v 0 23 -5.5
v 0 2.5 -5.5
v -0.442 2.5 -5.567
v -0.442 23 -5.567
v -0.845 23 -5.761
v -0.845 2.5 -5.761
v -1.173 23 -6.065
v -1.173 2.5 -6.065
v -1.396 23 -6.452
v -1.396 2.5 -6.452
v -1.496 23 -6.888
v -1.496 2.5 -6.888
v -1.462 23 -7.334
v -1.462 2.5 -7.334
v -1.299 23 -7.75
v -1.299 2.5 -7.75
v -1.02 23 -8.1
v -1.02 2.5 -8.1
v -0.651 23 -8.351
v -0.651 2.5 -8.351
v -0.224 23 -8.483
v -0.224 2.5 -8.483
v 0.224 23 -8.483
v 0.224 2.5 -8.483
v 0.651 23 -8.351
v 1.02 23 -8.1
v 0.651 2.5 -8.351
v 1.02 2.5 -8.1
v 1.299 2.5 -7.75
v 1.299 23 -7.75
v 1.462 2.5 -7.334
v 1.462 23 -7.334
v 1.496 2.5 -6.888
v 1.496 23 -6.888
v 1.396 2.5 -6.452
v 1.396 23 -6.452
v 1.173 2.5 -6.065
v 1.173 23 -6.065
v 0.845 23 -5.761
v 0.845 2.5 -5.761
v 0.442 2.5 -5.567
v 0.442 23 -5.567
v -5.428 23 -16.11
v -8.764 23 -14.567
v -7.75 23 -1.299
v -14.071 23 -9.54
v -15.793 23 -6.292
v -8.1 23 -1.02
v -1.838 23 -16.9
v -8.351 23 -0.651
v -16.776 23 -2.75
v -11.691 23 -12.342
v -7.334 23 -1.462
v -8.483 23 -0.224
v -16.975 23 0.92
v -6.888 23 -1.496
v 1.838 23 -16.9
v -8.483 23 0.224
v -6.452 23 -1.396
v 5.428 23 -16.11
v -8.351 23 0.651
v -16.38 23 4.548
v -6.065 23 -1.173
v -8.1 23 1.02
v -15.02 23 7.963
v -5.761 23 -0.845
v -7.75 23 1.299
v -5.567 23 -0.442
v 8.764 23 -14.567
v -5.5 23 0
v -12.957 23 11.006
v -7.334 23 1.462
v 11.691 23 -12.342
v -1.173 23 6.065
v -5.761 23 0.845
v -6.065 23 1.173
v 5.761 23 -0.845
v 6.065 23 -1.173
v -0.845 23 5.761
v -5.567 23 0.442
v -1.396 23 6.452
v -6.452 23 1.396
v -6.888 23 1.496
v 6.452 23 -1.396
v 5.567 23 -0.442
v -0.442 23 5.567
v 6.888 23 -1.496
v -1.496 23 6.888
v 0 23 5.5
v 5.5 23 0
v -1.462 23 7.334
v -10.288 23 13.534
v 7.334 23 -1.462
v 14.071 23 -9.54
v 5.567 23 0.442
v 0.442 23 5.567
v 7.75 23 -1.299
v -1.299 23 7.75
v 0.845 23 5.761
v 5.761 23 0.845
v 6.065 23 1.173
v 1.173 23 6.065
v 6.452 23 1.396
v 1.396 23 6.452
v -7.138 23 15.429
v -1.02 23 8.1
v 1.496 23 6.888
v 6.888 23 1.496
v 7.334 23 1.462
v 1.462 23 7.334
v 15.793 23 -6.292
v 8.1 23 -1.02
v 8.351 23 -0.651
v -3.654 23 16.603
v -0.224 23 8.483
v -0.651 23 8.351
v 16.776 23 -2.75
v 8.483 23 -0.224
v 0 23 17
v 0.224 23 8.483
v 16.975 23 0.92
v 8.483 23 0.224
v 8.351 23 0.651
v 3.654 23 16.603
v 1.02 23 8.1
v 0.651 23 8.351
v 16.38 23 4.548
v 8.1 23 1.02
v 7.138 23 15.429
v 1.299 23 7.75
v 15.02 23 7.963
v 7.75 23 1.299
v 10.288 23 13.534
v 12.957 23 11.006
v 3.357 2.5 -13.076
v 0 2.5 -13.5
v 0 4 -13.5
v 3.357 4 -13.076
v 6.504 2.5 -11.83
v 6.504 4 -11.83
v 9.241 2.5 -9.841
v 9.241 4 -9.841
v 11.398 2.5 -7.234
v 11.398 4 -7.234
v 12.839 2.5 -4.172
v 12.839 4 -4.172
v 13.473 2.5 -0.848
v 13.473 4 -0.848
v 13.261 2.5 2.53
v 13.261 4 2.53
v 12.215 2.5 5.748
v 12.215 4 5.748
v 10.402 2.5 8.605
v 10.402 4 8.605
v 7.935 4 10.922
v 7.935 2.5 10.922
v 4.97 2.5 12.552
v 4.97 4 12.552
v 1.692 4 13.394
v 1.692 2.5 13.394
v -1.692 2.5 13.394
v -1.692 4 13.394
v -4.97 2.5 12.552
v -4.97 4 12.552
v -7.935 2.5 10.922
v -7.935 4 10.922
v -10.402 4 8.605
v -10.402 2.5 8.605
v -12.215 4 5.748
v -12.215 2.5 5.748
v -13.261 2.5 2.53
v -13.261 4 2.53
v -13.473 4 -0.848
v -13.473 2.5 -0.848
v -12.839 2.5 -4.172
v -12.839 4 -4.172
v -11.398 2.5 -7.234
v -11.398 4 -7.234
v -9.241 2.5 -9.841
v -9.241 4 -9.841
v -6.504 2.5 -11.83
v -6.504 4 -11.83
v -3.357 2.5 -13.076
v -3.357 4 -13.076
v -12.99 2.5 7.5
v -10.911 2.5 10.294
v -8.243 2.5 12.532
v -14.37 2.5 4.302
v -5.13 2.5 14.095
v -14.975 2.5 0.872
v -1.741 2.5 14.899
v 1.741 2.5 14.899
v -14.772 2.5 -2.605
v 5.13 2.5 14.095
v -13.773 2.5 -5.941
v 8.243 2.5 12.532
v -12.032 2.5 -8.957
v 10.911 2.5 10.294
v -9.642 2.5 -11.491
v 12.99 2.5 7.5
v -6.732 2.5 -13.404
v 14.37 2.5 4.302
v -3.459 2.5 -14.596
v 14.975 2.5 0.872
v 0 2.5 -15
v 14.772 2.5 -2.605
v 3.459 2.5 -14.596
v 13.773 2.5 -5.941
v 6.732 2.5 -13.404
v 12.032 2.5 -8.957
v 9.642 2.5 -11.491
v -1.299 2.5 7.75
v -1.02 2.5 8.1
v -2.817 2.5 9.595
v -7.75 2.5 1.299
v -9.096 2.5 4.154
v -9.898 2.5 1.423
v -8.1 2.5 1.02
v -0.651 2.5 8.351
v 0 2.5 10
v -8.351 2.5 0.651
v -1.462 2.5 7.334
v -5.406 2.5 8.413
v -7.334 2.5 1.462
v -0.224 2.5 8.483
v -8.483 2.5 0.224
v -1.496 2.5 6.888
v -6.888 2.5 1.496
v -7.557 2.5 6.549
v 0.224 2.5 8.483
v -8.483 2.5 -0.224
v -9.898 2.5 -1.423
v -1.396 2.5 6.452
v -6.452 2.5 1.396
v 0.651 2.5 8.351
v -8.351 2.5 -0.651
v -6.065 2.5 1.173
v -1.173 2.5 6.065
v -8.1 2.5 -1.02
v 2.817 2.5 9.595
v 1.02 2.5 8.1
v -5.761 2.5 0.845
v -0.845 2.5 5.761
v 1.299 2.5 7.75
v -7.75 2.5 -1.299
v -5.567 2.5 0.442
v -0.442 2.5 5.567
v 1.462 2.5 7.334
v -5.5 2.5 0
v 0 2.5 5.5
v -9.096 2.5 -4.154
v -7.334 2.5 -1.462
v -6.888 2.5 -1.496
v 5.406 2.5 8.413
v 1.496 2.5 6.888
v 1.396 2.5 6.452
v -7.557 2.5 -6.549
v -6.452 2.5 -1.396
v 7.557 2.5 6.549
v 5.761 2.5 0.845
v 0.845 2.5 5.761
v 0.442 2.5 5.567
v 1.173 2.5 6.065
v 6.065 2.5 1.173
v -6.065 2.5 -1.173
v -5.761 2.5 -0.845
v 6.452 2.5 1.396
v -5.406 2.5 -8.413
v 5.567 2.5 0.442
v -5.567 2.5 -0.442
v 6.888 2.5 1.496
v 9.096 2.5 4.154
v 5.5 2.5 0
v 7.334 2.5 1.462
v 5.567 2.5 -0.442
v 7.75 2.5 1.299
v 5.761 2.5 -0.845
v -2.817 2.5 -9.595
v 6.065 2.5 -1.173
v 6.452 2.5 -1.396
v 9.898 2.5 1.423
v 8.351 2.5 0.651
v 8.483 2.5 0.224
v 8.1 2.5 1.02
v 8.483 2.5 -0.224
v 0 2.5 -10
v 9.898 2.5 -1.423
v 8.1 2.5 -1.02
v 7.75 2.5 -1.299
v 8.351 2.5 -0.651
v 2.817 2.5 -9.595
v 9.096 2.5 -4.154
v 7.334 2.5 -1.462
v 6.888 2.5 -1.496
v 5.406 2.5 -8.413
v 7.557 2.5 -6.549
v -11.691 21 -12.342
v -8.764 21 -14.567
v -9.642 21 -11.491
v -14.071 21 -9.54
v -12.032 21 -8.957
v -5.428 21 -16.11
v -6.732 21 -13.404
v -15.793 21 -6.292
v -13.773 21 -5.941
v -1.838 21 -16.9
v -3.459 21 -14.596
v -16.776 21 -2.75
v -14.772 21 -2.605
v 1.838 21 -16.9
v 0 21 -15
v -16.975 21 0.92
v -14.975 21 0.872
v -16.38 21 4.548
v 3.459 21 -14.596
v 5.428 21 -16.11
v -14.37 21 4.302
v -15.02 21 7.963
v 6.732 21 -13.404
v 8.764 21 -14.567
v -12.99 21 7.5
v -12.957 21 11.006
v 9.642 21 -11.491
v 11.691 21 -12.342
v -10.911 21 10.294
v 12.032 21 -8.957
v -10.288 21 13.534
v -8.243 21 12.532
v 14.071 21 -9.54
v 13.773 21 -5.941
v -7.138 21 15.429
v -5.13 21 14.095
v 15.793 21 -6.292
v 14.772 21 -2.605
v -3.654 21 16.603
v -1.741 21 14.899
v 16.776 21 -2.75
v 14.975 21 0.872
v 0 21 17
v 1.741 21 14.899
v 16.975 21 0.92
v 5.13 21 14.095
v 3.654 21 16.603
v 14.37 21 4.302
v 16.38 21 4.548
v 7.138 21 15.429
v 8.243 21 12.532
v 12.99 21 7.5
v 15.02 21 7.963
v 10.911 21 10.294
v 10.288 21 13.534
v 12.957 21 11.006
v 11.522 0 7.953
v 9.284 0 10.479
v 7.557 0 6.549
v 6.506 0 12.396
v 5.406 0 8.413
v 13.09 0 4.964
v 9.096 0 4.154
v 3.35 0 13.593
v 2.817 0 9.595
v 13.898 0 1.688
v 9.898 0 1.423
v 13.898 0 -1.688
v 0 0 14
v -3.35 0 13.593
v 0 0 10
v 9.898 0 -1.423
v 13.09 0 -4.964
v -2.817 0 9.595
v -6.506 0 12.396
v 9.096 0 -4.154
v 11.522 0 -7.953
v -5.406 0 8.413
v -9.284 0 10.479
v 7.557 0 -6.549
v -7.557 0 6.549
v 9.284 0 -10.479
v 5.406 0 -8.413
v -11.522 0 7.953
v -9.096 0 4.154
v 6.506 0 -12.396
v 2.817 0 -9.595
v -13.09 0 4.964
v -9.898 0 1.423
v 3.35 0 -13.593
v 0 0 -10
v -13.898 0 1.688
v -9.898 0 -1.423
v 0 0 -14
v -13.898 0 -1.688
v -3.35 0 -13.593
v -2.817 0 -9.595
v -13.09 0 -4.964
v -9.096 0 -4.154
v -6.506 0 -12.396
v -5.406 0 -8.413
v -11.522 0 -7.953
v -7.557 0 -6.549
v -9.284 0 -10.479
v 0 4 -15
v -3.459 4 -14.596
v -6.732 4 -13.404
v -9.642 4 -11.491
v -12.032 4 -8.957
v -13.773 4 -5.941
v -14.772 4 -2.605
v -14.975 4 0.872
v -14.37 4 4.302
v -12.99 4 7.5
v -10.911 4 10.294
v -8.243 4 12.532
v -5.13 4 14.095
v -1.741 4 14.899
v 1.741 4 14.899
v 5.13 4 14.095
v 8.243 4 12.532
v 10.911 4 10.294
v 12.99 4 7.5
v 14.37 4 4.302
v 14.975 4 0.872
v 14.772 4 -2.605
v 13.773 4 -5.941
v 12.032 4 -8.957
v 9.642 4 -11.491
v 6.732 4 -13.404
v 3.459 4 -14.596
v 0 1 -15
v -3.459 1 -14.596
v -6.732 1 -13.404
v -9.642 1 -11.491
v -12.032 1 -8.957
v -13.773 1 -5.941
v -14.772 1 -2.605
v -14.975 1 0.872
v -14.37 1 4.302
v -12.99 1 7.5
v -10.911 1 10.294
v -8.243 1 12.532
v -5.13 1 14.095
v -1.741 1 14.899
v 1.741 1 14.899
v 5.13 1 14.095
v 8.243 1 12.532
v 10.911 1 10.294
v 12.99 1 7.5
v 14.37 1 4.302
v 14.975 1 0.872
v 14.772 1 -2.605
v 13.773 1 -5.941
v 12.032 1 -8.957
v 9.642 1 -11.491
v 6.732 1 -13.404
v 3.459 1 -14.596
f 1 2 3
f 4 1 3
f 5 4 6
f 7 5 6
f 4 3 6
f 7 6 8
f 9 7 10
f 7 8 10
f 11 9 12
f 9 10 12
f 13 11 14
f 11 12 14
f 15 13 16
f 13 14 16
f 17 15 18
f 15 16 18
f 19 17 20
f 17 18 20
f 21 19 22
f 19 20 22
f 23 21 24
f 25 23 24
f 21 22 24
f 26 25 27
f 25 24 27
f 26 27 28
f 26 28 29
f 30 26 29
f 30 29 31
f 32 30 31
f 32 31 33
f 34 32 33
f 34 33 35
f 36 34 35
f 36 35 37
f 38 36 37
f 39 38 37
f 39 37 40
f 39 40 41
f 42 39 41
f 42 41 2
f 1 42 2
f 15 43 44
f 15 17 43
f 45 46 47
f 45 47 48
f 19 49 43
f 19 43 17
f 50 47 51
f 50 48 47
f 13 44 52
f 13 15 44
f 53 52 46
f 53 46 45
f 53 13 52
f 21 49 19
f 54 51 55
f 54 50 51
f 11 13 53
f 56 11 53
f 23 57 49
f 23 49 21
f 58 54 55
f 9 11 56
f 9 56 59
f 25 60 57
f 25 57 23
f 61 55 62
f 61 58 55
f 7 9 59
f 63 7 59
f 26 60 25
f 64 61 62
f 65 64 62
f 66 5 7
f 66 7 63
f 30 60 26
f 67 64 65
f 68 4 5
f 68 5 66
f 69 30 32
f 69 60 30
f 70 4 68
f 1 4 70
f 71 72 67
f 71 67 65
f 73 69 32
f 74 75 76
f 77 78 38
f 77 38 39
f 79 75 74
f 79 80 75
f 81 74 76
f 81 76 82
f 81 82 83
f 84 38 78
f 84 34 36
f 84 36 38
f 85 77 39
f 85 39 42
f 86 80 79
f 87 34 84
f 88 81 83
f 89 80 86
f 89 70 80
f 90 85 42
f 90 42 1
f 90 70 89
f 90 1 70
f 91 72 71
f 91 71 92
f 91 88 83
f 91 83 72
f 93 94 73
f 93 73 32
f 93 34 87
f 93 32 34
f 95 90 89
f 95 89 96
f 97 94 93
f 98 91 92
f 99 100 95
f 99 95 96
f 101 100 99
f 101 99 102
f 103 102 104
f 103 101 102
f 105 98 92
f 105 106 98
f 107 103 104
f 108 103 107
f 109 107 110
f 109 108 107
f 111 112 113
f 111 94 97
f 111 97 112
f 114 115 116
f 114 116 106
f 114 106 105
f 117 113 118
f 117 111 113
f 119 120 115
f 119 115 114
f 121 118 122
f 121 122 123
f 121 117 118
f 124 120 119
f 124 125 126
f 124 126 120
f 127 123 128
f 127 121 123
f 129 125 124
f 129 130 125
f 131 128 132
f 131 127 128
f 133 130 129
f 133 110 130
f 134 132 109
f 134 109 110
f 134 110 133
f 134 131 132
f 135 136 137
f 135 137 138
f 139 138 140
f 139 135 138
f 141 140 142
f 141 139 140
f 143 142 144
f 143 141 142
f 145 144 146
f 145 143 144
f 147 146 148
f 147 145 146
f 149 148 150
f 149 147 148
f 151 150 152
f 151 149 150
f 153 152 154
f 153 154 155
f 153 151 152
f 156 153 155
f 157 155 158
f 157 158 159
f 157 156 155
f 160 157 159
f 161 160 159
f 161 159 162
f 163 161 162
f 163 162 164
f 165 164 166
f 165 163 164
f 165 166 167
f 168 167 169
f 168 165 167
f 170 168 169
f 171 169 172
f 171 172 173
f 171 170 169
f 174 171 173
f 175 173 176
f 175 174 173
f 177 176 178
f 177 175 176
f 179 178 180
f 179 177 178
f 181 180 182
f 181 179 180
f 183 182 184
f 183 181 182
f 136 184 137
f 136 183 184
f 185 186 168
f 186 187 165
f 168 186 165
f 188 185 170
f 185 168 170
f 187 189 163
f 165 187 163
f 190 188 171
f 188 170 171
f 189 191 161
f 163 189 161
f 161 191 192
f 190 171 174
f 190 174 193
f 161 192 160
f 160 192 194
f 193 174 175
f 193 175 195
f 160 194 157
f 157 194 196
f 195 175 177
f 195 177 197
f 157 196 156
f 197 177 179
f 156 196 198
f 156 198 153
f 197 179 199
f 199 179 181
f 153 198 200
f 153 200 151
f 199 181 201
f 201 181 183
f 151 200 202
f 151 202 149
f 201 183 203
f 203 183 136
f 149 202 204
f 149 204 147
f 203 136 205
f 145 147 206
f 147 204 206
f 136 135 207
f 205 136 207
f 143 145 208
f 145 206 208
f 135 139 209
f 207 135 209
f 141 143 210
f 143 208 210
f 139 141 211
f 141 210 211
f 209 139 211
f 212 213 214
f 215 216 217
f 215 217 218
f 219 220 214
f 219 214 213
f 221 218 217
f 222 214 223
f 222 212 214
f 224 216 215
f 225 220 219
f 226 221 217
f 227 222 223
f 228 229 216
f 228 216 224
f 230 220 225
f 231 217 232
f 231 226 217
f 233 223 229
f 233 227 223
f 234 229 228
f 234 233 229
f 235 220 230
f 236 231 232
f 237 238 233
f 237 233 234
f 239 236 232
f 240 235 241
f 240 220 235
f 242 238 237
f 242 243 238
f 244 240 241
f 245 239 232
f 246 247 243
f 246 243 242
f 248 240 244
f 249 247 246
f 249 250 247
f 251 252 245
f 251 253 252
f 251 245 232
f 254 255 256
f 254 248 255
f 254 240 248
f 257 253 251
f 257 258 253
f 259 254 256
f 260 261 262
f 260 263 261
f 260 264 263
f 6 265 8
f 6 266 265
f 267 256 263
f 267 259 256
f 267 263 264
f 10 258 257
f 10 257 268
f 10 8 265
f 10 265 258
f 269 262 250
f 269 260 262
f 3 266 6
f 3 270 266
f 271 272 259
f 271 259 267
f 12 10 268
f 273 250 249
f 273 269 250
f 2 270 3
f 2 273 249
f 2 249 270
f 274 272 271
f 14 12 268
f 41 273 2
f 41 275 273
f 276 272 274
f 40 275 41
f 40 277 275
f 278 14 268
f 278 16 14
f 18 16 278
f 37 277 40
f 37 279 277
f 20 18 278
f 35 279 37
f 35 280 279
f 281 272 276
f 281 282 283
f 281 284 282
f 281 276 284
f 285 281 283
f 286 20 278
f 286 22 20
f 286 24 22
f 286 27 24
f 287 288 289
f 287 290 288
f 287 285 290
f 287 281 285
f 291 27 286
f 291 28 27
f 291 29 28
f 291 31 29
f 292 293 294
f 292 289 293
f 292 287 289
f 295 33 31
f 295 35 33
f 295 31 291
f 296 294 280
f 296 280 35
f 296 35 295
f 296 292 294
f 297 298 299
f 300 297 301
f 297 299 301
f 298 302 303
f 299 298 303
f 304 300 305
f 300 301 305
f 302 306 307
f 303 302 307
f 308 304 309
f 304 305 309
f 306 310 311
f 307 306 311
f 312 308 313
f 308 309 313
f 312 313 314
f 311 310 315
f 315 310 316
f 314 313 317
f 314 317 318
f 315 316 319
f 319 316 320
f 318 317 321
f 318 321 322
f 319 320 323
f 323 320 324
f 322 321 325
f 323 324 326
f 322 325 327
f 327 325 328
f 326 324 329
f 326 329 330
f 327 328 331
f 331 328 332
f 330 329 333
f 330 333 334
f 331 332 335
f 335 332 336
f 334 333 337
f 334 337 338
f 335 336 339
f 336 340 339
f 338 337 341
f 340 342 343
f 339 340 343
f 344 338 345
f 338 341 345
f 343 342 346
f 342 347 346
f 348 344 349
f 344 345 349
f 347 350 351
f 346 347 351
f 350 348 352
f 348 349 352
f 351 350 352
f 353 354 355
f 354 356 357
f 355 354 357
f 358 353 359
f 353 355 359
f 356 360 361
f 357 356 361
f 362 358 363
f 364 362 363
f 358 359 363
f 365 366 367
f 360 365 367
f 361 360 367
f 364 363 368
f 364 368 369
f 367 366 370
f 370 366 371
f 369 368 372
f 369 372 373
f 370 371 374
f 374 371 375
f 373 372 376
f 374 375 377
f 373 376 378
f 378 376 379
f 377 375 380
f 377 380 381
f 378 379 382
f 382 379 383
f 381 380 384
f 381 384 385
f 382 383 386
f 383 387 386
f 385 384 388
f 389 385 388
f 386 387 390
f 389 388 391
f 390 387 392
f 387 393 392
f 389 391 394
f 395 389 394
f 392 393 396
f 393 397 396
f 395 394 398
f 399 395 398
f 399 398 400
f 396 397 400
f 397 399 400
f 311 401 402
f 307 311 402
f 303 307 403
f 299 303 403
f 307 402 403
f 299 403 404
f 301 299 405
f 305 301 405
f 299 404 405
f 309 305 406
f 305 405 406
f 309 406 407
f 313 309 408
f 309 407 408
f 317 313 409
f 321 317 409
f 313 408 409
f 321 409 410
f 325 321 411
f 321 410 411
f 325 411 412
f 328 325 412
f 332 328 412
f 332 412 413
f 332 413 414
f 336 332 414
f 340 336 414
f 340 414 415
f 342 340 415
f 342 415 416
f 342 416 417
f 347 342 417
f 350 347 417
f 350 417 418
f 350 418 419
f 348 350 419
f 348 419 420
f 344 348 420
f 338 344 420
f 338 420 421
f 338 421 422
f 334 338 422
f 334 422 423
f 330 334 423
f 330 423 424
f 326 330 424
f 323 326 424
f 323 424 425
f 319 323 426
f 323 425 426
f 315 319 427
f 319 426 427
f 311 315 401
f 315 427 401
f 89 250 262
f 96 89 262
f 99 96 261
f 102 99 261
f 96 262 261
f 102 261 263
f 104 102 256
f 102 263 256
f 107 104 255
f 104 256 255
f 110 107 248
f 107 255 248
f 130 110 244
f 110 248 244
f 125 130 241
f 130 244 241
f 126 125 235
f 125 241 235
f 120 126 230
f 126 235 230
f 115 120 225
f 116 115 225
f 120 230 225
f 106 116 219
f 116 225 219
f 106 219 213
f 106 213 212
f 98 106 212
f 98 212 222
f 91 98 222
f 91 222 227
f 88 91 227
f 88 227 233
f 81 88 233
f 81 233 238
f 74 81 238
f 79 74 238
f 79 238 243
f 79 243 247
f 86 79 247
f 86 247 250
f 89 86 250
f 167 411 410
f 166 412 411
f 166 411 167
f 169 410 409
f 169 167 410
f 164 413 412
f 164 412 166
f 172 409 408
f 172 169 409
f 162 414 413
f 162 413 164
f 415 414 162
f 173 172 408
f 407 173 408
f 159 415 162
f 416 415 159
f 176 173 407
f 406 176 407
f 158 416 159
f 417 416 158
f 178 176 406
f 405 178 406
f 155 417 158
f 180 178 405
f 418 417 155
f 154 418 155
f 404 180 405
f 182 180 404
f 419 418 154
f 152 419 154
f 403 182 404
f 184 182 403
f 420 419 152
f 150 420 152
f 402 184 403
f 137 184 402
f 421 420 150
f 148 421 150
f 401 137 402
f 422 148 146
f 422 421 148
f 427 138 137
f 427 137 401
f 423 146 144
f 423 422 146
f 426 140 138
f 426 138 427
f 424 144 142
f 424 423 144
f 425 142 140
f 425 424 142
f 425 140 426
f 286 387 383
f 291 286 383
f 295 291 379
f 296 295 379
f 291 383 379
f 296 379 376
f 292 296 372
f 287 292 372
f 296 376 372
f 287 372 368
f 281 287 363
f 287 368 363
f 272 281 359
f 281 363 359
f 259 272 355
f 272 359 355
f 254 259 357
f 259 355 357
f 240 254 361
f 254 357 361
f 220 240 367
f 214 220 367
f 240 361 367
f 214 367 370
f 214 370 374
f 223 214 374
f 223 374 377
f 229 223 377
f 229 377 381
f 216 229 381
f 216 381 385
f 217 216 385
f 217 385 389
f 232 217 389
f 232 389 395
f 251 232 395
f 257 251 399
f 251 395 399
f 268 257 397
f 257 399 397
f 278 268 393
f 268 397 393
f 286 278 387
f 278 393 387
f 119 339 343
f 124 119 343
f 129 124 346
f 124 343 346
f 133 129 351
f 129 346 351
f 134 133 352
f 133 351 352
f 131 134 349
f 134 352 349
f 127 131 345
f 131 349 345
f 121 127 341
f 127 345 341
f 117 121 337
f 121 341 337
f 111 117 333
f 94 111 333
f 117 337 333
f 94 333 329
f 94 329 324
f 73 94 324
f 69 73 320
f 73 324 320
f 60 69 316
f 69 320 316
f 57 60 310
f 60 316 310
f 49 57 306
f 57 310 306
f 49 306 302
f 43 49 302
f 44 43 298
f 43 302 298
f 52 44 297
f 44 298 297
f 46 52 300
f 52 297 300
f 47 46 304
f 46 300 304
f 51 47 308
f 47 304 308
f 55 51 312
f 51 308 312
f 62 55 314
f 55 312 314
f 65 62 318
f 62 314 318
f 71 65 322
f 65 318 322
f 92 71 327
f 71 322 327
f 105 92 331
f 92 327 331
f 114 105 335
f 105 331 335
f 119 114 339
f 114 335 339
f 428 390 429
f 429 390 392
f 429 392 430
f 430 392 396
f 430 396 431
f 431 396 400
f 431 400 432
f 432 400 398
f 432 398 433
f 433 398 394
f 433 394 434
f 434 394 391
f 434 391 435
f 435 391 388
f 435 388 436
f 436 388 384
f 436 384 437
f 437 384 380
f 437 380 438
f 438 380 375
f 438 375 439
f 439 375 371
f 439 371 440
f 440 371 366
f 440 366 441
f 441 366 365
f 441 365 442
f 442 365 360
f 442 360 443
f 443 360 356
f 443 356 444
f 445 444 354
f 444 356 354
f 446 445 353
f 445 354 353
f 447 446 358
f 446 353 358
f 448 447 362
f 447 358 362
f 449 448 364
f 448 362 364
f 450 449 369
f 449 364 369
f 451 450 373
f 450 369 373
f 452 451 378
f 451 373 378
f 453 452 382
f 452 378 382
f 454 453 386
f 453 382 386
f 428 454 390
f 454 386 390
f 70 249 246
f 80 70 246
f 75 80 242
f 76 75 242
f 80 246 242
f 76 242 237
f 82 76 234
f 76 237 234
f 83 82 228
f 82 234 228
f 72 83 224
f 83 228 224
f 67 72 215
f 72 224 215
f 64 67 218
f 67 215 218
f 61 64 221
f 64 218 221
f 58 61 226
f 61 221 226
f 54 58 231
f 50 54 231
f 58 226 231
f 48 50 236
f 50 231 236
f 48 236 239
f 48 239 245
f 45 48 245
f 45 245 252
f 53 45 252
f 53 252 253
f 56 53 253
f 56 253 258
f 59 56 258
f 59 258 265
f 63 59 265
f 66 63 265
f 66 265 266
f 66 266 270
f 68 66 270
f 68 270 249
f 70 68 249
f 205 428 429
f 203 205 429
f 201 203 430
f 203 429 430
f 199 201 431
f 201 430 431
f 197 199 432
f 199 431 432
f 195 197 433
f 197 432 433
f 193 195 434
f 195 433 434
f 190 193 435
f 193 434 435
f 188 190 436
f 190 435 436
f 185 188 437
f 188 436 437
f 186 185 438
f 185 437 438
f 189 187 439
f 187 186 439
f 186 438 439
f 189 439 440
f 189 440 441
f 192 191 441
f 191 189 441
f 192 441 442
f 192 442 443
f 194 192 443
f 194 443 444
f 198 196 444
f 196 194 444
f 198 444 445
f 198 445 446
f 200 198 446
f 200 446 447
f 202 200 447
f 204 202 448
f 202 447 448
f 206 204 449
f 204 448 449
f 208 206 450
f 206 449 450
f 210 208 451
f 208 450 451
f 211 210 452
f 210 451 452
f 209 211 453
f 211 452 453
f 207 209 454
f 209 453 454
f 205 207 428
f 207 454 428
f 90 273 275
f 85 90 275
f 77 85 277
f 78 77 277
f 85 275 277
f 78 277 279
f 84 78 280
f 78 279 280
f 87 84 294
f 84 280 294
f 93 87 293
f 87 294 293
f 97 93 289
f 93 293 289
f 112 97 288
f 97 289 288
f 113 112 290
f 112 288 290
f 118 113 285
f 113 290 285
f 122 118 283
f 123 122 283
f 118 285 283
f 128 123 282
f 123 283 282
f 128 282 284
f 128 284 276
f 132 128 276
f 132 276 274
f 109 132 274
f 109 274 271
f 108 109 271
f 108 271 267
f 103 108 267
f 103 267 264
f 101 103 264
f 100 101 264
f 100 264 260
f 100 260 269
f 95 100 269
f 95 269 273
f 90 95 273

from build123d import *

# Parameters (mm, degrees)
SKETCH_1_R               = 15
EXTRUDE_1_DEPTH          = 21
SKETCH_2_R               = 10
CUT_EXTRUDE_2_DEPTH      = 2.5
SKETCH_5_R               = 15
SKETCH_5_R_2             = 13.5
CUT_EXTRUDE_5_DEPTH      = 1.5
CHAMFER_1_SIZE           = 1
SKETCH_6_R               = 17
EXTRUDE_2_DEPTH          = 2
SKETCH_4_R               = 1.5
CUT_EXTRUDE_6_DEPTH      = 32.595094556
PATTERN_CIRCULAR_1_COUNT = 4


with BuildPart() as part:
    # Эскиз1 → Бобышка-Вытянуть1 (new body)
    with BuildSketch(Plane(origin=(0, 0, 0), x_dir=(1, 0, 0), z_dir=(0, 1, 0))):
        with Locations(Location((0, 0, 0), (0, 0, 90))):
            Circle(SKETCH_1_R)
    extrude(amount=EXTRUDE_1_DEPTH)

    # Эскиз2 → Вырез-Вытянуть2 (cut)
    with BuildSketch(Plane.XZ):
        with Locations(Location((0, 0, 0), (0, 0, 270))):
            Circle(SKETCH_2_R)
    extrude(amount=-CUT_EXTRUDE_2_DEPTH, mode=Mode.SUBTRACT)

    # Эскиз5 → Вырез-Вытянуть5 (cut)
    with BuildSketch(Plane(origin=(0, 2.5, 0), x_dir=(-1, 0, 0), z_dir=(0, -1, 0))):
        with Locations(Location((0, 0, 0), (0, 0, 90))):
            Circle(SKETCH_5_R)
        with Locations(Location((0, 0, 0), (0, 0, 90))):
            Circle(SKETCH_5_R_2, mode=Mode.SUBTRACT)
    extrude(amount=-CUT_EXTRUDE_5_DEPTH, mode=Mode.SUBTRACT)

    # Фаска1
    chamfer_1_edges = [part.edges().sort_by_distance(p)[0] for p in [
        (0, 0, 15),
    ]]
    chamfer(chamfer_1_edges, length=CHAMFER_1_SIZE)

    # Эскиз6 → Бобышка-Вытянуть2 (add)
    with BuildSketch(Plane(origin=(0, 21, 0), x_dir=(1, 0, 0), z_dir=(0, 1, 0))):
        with Locations(Location((0, 0, 0), (0, 0, 270))):
            Circle(SKETCH_6_R)
    extrude(amount=EXTRUDE_2_DEPTH)

    # Эскиз4 → Вырез-Вытянуть6 (cut, through all)
    with BuildSketch(Plane.XZ.offset(-2.5)):
        with Locations(Location((0, 7, 0), (0, 0, 270))):
            Circle(SKETCH_4_R)
    cut_extrude_6 = extrude(amount=-CUT_EXTRUDE_6_DEPTH, mode=Mode.SUBTRACT)

    # Круговой массив1: Вырез-Вытянуть6 ×4 about axis
    pattern_circular_1_axis = Axis((0, 0, 0), (0, 1, 0))
    for i in range(1, PATTERN_CIRCULAR_1_COUNT):
        add(cut_extrude_6.rotate(pattern_circular_1_axis, i * 360 / PATTERN_CIRCULAR_1_COUNT), mode=Mode.SUBTRACT)


solid = part.part
